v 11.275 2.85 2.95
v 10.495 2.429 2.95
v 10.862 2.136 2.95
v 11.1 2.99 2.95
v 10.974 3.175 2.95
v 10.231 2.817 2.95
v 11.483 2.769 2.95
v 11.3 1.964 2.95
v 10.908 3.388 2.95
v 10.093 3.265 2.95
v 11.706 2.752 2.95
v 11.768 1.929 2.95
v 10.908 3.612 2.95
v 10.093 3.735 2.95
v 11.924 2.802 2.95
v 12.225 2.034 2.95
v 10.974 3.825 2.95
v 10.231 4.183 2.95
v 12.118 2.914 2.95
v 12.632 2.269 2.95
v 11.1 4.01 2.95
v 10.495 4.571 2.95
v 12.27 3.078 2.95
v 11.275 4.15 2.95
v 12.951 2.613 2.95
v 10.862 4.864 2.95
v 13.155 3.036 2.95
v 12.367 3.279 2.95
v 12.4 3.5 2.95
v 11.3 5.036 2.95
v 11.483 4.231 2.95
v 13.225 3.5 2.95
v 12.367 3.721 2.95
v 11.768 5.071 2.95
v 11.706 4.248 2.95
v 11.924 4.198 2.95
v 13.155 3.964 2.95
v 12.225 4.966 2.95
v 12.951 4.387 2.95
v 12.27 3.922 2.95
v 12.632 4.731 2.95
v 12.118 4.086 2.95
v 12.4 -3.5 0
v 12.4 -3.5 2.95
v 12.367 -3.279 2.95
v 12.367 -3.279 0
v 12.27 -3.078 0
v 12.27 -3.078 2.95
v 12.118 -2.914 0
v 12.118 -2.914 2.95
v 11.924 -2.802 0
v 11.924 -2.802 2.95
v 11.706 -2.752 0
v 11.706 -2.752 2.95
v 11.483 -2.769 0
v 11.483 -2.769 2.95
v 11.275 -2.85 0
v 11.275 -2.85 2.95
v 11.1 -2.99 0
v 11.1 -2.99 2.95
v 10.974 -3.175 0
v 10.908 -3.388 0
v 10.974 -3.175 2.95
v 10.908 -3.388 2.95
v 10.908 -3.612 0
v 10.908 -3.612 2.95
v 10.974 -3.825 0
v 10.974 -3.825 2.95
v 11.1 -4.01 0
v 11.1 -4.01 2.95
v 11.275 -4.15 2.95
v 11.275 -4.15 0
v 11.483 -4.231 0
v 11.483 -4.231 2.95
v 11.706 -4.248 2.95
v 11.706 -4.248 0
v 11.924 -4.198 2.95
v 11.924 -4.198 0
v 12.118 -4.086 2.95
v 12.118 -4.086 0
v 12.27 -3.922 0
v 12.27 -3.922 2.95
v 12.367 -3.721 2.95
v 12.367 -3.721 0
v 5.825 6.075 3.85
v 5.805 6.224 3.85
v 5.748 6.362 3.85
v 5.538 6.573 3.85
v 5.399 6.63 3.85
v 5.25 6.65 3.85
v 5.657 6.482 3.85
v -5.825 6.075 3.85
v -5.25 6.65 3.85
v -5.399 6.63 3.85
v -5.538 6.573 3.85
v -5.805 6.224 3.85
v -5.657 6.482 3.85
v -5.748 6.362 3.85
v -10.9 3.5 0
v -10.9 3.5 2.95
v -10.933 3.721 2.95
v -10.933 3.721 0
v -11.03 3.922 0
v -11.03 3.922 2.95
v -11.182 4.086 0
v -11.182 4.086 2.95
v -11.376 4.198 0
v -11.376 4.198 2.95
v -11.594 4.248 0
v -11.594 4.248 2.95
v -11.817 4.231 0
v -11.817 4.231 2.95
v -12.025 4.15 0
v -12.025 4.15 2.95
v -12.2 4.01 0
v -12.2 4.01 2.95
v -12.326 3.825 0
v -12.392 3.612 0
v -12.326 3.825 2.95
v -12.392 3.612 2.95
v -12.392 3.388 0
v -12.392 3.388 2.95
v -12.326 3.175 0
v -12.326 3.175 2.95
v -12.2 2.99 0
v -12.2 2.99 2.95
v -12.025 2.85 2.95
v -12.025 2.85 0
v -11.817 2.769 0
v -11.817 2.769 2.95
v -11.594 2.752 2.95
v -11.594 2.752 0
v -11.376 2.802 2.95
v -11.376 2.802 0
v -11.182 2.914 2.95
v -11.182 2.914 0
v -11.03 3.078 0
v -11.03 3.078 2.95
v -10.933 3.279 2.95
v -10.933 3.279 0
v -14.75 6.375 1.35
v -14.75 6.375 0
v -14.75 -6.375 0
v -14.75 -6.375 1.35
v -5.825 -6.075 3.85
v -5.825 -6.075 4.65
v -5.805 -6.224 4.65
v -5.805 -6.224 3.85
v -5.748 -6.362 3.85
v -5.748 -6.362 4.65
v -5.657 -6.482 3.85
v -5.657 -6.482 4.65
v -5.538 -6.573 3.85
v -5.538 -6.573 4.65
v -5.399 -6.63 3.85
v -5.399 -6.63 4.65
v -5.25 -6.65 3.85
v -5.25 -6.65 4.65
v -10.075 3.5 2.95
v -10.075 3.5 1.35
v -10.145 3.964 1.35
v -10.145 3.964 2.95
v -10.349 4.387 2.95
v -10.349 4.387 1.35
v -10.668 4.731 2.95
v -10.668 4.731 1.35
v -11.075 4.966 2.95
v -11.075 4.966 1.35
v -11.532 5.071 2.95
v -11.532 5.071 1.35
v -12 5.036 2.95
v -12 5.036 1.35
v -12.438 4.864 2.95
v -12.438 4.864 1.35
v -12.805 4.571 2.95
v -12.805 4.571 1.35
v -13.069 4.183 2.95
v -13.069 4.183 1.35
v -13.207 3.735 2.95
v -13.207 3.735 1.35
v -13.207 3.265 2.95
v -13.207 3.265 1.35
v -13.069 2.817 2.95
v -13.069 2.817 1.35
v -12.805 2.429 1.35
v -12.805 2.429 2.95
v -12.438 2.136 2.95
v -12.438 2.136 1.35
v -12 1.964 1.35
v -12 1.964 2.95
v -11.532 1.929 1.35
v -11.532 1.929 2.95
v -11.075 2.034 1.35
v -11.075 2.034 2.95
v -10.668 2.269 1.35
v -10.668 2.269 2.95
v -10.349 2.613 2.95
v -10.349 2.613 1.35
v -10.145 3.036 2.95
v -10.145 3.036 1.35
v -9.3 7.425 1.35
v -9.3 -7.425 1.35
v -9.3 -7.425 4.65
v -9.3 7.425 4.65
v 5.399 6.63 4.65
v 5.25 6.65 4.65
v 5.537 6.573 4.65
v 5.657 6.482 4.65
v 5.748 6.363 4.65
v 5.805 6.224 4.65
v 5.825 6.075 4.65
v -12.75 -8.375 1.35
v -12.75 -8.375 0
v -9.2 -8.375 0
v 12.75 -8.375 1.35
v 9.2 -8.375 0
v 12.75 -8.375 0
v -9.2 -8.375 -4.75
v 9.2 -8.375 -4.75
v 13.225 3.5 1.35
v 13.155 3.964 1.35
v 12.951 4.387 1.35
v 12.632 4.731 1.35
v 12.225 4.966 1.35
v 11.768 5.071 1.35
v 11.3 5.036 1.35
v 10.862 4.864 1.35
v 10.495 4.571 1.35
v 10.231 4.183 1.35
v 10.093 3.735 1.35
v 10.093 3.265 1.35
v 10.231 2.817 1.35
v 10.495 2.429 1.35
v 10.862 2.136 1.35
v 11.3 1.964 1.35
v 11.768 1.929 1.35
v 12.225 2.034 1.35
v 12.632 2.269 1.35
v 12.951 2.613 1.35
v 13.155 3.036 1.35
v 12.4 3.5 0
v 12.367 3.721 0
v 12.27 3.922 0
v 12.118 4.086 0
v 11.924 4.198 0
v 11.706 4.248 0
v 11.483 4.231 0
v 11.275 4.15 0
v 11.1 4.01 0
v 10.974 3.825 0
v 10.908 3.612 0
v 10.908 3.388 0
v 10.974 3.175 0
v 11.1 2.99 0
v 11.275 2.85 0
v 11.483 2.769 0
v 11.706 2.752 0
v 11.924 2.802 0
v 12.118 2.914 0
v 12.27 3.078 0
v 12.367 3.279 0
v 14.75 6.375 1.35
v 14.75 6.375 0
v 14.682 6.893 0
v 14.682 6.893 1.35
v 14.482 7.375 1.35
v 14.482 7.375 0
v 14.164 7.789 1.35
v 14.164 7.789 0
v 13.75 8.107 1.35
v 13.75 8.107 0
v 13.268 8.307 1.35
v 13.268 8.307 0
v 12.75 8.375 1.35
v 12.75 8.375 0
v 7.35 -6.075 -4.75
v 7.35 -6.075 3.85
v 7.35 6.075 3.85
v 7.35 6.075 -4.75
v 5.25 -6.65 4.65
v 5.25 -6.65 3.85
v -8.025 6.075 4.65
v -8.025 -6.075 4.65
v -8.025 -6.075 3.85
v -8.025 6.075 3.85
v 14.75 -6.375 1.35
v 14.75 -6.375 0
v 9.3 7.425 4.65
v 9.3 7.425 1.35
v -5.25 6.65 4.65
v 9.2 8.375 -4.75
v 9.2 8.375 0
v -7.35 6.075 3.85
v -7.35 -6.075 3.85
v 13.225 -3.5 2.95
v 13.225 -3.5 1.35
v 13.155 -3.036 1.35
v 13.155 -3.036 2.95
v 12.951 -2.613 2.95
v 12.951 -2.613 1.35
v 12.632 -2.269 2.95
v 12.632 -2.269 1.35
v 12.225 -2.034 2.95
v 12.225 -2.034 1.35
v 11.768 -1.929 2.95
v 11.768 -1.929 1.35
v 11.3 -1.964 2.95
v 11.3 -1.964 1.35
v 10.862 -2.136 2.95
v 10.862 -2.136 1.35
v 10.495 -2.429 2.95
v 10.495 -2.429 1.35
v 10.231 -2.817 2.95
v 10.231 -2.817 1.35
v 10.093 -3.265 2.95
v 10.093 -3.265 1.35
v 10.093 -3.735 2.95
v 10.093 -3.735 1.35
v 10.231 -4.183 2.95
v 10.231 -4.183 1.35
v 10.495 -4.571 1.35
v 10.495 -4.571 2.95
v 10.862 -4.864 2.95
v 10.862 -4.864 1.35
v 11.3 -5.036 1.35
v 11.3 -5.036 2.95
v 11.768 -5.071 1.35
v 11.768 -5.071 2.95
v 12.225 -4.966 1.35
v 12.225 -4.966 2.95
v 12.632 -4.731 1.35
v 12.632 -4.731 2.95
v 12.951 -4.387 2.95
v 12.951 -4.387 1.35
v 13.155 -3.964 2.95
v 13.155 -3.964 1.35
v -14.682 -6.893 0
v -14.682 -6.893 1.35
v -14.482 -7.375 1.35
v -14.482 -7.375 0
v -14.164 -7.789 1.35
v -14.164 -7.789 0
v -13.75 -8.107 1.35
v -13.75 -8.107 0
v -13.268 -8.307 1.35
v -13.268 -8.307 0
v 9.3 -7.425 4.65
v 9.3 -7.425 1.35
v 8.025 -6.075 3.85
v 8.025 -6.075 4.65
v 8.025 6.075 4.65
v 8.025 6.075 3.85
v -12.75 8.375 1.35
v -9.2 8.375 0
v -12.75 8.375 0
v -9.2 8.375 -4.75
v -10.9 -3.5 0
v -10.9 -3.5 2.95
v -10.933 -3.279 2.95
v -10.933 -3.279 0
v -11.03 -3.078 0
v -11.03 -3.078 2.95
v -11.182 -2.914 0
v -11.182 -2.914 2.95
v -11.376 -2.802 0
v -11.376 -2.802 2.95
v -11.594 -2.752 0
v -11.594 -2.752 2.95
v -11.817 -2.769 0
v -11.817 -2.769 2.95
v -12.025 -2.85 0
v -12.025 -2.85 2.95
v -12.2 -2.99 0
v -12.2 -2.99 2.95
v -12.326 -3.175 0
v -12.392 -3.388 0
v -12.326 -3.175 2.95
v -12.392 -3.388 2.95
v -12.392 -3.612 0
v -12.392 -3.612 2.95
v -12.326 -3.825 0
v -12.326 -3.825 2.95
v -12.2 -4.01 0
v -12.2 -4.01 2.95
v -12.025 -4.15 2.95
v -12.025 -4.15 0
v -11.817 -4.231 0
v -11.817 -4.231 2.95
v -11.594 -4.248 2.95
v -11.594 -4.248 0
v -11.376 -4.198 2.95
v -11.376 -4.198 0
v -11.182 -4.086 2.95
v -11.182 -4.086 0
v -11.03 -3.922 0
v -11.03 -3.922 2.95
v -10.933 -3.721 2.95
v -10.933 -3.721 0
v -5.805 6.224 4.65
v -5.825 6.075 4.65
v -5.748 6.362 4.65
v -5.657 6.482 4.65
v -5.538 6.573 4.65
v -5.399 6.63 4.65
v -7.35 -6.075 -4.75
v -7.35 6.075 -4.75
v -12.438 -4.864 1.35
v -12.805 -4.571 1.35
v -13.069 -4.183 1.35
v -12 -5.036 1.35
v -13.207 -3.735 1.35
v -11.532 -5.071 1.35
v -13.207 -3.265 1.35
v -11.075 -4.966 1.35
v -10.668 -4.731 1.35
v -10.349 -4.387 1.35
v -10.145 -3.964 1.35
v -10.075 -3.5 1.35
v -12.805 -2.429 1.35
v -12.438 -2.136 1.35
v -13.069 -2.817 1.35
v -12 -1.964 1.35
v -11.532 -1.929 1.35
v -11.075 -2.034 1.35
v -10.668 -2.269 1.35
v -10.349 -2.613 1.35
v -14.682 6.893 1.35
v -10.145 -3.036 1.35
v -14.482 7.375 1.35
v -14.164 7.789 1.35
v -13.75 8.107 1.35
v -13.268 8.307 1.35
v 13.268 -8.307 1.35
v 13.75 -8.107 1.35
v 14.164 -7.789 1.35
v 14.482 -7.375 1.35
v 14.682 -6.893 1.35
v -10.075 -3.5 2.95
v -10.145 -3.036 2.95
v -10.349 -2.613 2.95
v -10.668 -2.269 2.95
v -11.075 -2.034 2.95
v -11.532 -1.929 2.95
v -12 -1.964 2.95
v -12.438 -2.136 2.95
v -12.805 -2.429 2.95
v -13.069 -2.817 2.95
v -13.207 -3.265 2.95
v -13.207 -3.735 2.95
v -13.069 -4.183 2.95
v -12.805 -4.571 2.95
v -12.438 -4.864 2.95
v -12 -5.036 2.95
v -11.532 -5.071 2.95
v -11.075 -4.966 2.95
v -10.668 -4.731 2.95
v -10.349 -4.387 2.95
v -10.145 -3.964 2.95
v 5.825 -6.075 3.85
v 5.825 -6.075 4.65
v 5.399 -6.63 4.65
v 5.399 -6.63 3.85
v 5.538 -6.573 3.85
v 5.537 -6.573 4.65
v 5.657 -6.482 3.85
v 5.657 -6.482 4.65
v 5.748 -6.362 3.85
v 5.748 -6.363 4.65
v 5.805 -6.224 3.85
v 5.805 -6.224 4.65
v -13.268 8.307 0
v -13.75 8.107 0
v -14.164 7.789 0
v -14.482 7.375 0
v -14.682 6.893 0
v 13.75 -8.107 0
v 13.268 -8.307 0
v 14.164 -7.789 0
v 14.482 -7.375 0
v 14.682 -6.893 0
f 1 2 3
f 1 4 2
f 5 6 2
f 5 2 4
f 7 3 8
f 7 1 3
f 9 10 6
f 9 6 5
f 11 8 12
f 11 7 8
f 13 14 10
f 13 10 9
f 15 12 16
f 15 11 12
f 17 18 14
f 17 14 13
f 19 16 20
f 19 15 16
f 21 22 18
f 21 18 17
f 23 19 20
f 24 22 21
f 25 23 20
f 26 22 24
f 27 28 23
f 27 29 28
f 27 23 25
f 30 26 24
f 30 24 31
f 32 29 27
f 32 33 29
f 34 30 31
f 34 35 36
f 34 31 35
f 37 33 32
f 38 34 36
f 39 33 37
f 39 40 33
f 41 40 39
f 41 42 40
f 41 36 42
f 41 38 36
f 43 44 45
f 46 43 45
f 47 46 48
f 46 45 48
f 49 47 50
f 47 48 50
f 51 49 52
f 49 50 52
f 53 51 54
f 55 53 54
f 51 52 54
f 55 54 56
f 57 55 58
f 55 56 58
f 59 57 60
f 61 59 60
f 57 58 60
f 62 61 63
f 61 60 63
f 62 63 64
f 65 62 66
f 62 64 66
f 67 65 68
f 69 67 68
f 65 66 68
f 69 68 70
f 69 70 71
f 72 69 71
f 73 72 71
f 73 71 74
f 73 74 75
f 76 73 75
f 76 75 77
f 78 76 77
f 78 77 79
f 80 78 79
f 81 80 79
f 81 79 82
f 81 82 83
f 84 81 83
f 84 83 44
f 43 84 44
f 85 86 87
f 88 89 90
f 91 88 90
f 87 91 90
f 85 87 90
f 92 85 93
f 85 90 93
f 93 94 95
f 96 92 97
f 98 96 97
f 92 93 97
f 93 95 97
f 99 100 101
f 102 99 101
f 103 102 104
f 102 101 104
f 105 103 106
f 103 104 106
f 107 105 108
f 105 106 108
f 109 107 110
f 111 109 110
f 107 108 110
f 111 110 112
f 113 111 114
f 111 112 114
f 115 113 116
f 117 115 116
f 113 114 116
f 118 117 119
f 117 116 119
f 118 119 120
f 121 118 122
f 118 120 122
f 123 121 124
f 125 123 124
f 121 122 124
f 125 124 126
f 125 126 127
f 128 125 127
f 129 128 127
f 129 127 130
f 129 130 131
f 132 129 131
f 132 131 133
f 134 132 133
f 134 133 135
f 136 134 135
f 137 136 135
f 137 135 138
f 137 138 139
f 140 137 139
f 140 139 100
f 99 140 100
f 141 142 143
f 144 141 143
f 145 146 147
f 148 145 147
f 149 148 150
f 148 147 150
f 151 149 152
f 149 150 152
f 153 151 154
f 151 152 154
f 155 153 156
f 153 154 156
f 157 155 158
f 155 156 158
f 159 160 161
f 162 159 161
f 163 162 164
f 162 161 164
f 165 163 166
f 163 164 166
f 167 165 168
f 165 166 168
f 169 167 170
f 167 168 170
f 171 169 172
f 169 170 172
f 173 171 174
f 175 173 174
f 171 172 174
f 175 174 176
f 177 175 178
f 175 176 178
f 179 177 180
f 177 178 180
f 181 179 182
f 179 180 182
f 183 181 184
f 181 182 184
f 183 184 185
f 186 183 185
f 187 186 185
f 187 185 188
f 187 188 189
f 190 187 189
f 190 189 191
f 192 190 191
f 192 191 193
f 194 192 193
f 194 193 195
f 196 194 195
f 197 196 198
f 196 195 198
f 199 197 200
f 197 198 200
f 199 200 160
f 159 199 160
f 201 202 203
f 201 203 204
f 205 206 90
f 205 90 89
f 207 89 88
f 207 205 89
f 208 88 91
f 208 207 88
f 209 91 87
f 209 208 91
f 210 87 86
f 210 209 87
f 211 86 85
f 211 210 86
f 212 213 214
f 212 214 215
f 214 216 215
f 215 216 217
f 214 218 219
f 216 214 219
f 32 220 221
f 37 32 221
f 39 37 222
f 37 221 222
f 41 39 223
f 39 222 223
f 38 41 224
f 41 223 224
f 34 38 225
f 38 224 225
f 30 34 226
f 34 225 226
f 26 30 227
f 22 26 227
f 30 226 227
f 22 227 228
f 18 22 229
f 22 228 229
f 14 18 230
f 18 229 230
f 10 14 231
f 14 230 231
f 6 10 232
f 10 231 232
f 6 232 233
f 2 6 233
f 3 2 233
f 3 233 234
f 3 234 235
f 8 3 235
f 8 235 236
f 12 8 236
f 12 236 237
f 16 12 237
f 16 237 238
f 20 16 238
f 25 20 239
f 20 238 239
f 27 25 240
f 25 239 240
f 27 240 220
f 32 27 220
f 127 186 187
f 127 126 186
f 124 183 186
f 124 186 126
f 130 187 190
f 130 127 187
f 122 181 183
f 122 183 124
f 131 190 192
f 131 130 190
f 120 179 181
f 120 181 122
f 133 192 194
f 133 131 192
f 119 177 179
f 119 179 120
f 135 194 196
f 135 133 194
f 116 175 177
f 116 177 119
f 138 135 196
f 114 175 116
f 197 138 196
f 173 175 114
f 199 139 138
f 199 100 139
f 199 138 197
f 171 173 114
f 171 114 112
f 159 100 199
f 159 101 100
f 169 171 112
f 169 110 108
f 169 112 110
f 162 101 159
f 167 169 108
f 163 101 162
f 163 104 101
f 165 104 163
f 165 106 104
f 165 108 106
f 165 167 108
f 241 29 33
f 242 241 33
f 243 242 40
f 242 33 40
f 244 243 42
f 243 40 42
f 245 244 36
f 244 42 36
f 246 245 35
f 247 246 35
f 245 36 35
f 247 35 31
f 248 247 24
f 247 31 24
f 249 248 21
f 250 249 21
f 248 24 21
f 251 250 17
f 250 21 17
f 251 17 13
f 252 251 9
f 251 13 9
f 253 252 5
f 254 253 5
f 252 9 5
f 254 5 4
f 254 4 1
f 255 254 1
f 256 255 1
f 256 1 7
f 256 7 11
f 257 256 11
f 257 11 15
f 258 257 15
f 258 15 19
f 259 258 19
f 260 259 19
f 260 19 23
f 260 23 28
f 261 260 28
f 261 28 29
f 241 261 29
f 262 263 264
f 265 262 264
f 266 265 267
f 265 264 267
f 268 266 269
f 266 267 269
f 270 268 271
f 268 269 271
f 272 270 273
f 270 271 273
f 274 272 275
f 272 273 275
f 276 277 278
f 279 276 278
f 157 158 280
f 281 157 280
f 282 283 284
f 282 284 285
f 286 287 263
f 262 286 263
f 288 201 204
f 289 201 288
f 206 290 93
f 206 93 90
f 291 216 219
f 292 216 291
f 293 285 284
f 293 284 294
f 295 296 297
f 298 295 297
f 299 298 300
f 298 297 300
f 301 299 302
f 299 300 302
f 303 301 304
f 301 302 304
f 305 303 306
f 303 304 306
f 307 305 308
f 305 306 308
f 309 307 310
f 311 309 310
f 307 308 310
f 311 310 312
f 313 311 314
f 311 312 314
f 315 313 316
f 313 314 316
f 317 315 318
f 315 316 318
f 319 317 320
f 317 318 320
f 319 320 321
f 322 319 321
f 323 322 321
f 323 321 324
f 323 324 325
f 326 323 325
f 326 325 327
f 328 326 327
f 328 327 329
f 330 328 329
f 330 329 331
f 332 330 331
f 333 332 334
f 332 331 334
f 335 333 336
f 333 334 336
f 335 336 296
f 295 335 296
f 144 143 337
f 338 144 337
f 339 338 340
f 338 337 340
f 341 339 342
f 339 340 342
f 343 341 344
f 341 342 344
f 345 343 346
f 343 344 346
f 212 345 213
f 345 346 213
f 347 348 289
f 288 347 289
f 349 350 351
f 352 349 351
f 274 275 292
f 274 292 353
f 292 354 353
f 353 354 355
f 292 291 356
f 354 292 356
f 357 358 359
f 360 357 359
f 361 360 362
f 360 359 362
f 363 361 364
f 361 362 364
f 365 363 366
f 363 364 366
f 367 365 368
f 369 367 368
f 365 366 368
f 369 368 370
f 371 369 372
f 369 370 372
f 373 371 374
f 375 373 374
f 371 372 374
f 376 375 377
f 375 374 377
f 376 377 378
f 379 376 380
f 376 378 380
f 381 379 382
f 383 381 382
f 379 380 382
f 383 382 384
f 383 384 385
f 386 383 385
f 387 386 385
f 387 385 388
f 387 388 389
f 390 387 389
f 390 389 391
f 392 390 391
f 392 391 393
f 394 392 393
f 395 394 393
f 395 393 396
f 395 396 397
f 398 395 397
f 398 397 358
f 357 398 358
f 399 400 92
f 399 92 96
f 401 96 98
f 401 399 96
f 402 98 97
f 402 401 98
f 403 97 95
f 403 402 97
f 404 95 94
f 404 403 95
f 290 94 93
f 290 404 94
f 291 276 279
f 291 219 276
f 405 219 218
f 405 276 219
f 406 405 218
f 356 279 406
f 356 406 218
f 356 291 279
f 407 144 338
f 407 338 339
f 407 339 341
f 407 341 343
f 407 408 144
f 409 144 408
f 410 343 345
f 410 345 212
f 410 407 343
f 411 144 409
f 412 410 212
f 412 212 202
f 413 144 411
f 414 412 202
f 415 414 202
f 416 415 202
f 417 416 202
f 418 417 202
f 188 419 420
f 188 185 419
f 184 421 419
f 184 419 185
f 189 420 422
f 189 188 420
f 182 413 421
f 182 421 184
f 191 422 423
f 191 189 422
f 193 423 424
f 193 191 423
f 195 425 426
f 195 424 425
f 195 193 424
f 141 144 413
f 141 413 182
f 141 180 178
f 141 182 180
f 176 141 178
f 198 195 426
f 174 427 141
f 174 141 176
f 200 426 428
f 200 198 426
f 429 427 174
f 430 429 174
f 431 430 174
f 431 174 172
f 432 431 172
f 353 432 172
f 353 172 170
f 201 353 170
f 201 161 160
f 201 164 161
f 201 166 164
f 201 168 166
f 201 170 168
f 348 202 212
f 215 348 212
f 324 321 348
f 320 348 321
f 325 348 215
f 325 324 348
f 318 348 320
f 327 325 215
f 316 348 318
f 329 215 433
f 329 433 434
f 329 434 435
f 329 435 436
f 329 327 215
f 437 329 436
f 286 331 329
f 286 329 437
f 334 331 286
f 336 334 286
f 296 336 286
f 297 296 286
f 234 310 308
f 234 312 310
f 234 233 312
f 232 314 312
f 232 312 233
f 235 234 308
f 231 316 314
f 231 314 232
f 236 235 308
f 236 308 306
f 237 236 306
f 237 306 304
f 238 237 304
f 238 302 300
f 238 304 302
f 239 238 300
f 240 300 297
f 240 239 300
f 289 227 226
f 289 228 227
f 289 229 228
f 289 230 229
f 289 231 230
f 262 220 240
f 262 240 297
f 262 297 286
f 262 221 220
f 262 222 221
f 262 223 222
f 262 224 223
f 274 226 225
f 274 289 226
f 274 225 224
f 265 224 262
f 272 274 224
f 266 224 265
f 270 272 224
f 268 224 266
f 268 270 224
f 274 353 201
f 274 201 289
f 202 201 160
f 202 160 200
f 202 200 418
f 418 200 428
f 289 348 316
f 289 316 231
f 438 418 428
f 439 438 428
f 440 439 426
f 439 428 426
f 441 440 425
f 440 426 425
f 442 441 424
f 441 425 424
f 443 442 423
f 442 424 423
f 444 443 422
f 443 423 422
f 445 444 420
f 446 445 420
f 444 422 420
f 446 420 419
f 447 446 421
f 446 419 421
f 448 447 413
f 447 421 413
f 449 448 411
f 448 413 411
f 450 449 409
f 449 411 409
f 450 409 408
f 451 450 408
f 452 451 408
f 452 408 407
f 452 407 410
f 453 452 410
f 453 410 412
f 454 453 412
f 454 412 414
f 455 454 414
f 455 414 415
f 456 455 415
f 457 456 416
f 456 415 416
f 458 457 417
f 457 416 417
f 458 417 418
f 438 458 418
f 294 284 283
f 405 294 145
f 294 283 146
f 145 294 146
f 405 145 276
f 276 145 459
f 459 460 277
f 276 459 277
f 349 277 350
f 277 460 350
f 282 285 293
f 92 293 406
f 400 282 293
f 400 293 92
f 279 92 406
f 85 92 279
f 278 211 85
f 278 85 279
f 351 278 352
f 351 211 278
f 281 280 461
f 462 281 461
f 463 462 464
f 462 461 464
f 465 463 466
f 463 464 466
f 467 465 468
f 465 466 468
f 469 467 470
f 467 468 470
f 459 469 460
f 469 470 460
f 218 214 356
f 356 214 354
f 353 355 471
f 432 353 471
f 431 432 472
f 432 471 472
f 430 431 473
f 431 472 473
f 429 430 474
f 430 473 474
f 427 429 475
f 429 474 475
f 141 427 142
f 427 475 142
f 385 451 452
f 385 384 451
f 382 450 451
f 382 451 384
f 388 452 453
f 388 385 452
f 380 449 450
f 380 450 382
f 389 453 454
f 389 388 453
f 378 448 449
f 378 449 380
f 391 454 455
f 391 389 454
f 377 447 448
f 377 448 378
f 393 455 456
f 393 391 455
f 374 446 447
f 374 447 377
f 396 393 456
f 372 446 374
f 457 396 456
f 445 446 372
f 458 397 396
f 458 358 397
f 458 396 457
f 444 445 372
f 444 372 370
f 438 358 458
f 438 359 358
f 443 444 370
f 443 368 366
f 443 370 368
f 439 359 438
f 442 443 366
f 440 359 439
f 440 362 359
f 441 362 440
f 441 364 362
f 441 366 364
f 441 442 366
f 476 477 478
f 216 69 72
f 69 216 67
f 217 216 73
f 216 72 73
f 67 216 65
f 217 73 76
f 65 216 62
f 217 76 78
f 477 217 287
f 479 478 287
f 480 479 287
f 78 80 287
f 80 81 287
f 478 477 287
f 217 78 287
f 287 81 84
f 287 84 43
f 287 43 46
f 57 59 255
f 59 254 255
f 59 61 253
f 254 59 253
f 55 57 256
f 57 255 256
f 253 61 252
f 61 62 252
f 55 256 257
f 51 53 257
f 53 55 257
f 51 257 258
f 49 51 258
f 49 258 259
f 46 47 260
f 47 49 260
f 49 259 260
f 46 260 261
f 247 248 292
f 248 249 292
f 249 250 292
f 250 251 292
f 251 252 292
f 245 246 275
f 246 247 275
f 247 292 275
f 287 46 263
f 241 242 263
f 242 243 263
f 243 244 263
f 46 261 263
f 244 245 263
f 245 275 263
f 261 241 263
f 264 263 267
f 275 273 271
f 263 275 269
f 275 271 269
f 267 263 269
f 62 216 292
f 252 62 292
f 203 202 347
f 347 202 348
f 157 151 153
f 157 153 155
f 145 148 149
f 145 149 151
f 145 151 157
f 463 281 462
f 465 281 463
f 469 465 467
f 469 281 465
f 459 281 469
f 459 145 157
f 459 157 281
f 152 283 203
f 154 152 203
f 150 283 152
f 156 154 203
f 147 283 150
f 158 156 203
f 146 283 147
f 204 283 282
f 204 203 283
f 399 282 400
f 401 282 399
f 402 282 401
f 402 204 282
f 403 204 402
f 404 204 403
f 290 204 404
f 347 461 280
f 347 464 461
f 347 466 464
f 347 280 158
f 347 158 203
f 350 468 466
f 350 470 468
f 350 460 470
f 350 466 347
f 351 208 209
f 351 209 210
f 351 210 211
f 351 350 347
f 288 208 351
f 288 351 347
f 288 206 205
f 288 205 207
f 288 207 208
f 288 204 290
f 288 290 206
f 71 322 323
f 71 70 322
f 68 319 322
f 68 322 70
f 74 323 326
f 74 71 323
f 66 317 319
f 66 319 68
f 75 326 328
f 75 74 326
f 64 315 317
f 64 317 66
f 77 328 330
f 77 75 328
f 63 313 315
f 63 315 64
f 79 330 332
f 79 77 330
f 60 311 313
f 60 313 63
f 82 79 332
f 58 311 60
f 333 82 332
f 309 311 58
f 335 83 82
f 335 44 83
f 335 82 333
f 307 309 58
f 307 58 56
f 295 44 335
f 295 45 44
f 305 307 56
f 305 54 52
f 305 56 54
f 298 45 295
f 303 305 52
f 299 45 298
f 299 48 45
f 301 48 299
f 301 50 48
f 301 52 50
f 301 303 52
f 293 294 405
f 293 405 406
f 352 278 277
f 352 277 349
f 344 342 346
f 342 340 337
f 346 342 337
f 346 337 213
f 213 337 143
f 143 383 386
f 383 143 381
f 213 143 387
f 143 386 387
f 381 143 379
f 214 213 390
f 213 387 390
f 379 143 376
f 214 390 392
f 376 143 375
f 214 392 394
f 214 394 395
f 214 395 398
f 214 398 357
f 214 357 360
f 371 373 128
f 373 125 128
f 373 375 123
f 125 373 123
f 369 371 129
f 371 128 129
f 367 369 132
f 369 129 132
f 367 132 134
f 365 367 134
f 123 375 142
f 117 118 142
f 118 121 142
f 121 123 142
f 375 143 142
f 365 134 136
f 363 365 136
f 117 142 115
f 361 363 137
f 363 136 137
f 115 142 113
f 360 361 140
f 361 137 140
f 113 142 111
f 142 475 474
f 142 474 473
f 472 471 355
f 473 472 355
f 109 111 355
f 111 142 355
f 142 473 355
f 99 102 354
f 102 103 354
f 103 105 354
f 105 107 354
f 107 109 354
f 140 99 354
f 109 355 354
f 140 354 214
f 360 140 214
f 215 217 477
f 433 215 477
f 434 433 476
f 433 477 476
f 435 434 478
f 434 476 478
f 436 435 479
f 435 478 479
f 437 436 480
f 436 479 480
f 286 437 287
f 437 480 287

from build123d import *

# Parameters (mm, degrees)
EXTRUDE_1_DEPTH     = 1.35
SKETCH_8_W          = 18.4
SKETCH_8_H          = 16.75
EXTRUDE_4_DEPTH     = 4.75
SKETCH_2_R          = 1.575
EXTRUDE_2_DEPTH     = 1.6
SKETCH_4_W          = 18.6
SKETCH_4_H          = 14.85
EXTRUDE_3_DEPTH     = 3.3
SKETCH_3_W          = 14.7
SKETCH_3_H          = 12.15
CUT_EXTRUDE_1_DEPTH = 10.4
SKETCH_5_W          = 0.675
SKETCH_5_H          = 12.15
CUT_EXTRUDE_2_DEPTH = 0.8
SKETCH_6_R          = 0.75
CUT_EXTRUDE_3_DEPTH = 8.7


with BuildPart() as part:
    # Эскиз1 → Бобышка-Вытянуть1 (new body)
    with BuildSketch(Plane.XY):
        with BuildLine():
            Line((-12.75, -8.375), (12.75, -8.375))
            ThreePointArc((12.75, -8.375), (14.164213562, -7.789213562), (14.75, -6.375))
            Line((14.75, -6.375), (14.75, 6.375))
            ThreePointArc((14.75, 6.375), (14.164213562, 7.789213562), (12.75, 8.375))
            Line((12.75, 8.375), (-12.75, 8.375))
            ThreePointArc((-12.75, 8.375), (-14.164213562, 7.789213562), (-14.75, 6.375))
            Line((-14.75, 6.375), (-14.75, -6.375))
            ThreePointArc((-14.75, -6.375), (-14.164213562, -7.789213562), (-12.75, -8.375))
        make_face()
    extrude(amount=EXTRUDE_1_DEPTH)

    # Эскиз8 → Бобышка-Вытянуть4 (add)
    with BuildSketch(Plane(origin=(0, 0, 0), x_dir=(-1, 0, 0), z_dir=(0, 0, -1))):
        Rectangle(SKETCH_8_W, SKETCH_8_H)
    extrude(amount=EXTRUDE_4_DEPTH)

    # Эскиз2 → Бобышка-Вытянуть2 (add)
    with BuildSketch(Plane.XY.offset(1.35)):
        with Locations((-11.65, 3.5)):
            Circle(SKETCH_2_R)
        with Locations((11.65, 3.5)):
            Circle(SKETCH_2_R)
        with Locations((11.65, -3.5)):
            Circle(SKETCH_2_R)
        with Locations((-11.65, -3.5)):
            Circle(SKETCH_2_R)
    extrude(amount=EXTRUDE_2_DEPTH)

    # Эскиз4 → Бобышка-Вытянуть3 (add)
    with BuildSketch(Plane.XY.offset(1.35)):
        Rectangle(SKETCH_4_W, SKETCH_4_H)
    extrude(amount=EXTRUDE_3_DEPTH)

    # Эскиз3 → Вырез-Вытянуть1 (cut, through all)
    with BuildSketch(Plane.XY.offset(4.65)):
        Rectangle(SKETCH_3_W, SKETCH_3_H)
    extrude(amount=-CUT_EXTRUDE_1_DEPTH, mode=Mode.SUBTRACT)

    # Эскиз5 → Вырез-Вытянуть2 (cut)
    with BuildSketch(Plane.XY.offset(4.65)):
        with BuildLine():
            Line((-5.25, 6.65), (5.25, 6.65))
            ThreePointArc((5.25, 6.65), (5.825, 6.075), (5.25, 5.5))
            Line((5.25, 5.5), (-5.25, 5.5))
            ThreePointArc((-5.25, 5.5), (-5.825, 6.075), (-5.25, 6.65))
        make_face()
        with BuildLine():
            Line((-5.25, -6.65), (5.25, -6.65))
            ThreePointArc((5.25, -6.65), (5.825, -6.075), (5.25, -5.5))
            Line((5.25, -5.5), (-5.25, -5.5))
            ThreePointArc((-5.25, -5.5), (-5.825, -6.075), (-5.25, -6.65))
        make_face()
        with Locations((-7.6875, 0)):
            Rectangle(SKETCH_5_W, SKETCH_5_H)
        with Locations((7.6875, 0)):
            Rectangle(SKETCH_5_W, SKETCH_5_H)
    extrude(amount=-CUT_EXTRUDE_2_DEPTH, mode=Mode.SUBTRACT)

    # Эскиз6 → Вырез-Вытянуть3 (cut, through all)
    with BuildSketch(Plane.XY.offset(2.95)):
        with Locations((-11.65, 3.5)):
            Circle(SKETCH_6_R)
        with Locations((-11.65, -3.5)):
            Circle(SKETCH_6_R)
        with Locations((11.65, 3.5)):
            Circle(SKETCH_6_R)
        with Locations((11.65, -3.5)):
            Circle(SKETCH_6_R)
    extrude(amount=-CUT_EXTRUDE_3_DEPTH, mode=Mode.SUBTRACT)


solid = part.part
